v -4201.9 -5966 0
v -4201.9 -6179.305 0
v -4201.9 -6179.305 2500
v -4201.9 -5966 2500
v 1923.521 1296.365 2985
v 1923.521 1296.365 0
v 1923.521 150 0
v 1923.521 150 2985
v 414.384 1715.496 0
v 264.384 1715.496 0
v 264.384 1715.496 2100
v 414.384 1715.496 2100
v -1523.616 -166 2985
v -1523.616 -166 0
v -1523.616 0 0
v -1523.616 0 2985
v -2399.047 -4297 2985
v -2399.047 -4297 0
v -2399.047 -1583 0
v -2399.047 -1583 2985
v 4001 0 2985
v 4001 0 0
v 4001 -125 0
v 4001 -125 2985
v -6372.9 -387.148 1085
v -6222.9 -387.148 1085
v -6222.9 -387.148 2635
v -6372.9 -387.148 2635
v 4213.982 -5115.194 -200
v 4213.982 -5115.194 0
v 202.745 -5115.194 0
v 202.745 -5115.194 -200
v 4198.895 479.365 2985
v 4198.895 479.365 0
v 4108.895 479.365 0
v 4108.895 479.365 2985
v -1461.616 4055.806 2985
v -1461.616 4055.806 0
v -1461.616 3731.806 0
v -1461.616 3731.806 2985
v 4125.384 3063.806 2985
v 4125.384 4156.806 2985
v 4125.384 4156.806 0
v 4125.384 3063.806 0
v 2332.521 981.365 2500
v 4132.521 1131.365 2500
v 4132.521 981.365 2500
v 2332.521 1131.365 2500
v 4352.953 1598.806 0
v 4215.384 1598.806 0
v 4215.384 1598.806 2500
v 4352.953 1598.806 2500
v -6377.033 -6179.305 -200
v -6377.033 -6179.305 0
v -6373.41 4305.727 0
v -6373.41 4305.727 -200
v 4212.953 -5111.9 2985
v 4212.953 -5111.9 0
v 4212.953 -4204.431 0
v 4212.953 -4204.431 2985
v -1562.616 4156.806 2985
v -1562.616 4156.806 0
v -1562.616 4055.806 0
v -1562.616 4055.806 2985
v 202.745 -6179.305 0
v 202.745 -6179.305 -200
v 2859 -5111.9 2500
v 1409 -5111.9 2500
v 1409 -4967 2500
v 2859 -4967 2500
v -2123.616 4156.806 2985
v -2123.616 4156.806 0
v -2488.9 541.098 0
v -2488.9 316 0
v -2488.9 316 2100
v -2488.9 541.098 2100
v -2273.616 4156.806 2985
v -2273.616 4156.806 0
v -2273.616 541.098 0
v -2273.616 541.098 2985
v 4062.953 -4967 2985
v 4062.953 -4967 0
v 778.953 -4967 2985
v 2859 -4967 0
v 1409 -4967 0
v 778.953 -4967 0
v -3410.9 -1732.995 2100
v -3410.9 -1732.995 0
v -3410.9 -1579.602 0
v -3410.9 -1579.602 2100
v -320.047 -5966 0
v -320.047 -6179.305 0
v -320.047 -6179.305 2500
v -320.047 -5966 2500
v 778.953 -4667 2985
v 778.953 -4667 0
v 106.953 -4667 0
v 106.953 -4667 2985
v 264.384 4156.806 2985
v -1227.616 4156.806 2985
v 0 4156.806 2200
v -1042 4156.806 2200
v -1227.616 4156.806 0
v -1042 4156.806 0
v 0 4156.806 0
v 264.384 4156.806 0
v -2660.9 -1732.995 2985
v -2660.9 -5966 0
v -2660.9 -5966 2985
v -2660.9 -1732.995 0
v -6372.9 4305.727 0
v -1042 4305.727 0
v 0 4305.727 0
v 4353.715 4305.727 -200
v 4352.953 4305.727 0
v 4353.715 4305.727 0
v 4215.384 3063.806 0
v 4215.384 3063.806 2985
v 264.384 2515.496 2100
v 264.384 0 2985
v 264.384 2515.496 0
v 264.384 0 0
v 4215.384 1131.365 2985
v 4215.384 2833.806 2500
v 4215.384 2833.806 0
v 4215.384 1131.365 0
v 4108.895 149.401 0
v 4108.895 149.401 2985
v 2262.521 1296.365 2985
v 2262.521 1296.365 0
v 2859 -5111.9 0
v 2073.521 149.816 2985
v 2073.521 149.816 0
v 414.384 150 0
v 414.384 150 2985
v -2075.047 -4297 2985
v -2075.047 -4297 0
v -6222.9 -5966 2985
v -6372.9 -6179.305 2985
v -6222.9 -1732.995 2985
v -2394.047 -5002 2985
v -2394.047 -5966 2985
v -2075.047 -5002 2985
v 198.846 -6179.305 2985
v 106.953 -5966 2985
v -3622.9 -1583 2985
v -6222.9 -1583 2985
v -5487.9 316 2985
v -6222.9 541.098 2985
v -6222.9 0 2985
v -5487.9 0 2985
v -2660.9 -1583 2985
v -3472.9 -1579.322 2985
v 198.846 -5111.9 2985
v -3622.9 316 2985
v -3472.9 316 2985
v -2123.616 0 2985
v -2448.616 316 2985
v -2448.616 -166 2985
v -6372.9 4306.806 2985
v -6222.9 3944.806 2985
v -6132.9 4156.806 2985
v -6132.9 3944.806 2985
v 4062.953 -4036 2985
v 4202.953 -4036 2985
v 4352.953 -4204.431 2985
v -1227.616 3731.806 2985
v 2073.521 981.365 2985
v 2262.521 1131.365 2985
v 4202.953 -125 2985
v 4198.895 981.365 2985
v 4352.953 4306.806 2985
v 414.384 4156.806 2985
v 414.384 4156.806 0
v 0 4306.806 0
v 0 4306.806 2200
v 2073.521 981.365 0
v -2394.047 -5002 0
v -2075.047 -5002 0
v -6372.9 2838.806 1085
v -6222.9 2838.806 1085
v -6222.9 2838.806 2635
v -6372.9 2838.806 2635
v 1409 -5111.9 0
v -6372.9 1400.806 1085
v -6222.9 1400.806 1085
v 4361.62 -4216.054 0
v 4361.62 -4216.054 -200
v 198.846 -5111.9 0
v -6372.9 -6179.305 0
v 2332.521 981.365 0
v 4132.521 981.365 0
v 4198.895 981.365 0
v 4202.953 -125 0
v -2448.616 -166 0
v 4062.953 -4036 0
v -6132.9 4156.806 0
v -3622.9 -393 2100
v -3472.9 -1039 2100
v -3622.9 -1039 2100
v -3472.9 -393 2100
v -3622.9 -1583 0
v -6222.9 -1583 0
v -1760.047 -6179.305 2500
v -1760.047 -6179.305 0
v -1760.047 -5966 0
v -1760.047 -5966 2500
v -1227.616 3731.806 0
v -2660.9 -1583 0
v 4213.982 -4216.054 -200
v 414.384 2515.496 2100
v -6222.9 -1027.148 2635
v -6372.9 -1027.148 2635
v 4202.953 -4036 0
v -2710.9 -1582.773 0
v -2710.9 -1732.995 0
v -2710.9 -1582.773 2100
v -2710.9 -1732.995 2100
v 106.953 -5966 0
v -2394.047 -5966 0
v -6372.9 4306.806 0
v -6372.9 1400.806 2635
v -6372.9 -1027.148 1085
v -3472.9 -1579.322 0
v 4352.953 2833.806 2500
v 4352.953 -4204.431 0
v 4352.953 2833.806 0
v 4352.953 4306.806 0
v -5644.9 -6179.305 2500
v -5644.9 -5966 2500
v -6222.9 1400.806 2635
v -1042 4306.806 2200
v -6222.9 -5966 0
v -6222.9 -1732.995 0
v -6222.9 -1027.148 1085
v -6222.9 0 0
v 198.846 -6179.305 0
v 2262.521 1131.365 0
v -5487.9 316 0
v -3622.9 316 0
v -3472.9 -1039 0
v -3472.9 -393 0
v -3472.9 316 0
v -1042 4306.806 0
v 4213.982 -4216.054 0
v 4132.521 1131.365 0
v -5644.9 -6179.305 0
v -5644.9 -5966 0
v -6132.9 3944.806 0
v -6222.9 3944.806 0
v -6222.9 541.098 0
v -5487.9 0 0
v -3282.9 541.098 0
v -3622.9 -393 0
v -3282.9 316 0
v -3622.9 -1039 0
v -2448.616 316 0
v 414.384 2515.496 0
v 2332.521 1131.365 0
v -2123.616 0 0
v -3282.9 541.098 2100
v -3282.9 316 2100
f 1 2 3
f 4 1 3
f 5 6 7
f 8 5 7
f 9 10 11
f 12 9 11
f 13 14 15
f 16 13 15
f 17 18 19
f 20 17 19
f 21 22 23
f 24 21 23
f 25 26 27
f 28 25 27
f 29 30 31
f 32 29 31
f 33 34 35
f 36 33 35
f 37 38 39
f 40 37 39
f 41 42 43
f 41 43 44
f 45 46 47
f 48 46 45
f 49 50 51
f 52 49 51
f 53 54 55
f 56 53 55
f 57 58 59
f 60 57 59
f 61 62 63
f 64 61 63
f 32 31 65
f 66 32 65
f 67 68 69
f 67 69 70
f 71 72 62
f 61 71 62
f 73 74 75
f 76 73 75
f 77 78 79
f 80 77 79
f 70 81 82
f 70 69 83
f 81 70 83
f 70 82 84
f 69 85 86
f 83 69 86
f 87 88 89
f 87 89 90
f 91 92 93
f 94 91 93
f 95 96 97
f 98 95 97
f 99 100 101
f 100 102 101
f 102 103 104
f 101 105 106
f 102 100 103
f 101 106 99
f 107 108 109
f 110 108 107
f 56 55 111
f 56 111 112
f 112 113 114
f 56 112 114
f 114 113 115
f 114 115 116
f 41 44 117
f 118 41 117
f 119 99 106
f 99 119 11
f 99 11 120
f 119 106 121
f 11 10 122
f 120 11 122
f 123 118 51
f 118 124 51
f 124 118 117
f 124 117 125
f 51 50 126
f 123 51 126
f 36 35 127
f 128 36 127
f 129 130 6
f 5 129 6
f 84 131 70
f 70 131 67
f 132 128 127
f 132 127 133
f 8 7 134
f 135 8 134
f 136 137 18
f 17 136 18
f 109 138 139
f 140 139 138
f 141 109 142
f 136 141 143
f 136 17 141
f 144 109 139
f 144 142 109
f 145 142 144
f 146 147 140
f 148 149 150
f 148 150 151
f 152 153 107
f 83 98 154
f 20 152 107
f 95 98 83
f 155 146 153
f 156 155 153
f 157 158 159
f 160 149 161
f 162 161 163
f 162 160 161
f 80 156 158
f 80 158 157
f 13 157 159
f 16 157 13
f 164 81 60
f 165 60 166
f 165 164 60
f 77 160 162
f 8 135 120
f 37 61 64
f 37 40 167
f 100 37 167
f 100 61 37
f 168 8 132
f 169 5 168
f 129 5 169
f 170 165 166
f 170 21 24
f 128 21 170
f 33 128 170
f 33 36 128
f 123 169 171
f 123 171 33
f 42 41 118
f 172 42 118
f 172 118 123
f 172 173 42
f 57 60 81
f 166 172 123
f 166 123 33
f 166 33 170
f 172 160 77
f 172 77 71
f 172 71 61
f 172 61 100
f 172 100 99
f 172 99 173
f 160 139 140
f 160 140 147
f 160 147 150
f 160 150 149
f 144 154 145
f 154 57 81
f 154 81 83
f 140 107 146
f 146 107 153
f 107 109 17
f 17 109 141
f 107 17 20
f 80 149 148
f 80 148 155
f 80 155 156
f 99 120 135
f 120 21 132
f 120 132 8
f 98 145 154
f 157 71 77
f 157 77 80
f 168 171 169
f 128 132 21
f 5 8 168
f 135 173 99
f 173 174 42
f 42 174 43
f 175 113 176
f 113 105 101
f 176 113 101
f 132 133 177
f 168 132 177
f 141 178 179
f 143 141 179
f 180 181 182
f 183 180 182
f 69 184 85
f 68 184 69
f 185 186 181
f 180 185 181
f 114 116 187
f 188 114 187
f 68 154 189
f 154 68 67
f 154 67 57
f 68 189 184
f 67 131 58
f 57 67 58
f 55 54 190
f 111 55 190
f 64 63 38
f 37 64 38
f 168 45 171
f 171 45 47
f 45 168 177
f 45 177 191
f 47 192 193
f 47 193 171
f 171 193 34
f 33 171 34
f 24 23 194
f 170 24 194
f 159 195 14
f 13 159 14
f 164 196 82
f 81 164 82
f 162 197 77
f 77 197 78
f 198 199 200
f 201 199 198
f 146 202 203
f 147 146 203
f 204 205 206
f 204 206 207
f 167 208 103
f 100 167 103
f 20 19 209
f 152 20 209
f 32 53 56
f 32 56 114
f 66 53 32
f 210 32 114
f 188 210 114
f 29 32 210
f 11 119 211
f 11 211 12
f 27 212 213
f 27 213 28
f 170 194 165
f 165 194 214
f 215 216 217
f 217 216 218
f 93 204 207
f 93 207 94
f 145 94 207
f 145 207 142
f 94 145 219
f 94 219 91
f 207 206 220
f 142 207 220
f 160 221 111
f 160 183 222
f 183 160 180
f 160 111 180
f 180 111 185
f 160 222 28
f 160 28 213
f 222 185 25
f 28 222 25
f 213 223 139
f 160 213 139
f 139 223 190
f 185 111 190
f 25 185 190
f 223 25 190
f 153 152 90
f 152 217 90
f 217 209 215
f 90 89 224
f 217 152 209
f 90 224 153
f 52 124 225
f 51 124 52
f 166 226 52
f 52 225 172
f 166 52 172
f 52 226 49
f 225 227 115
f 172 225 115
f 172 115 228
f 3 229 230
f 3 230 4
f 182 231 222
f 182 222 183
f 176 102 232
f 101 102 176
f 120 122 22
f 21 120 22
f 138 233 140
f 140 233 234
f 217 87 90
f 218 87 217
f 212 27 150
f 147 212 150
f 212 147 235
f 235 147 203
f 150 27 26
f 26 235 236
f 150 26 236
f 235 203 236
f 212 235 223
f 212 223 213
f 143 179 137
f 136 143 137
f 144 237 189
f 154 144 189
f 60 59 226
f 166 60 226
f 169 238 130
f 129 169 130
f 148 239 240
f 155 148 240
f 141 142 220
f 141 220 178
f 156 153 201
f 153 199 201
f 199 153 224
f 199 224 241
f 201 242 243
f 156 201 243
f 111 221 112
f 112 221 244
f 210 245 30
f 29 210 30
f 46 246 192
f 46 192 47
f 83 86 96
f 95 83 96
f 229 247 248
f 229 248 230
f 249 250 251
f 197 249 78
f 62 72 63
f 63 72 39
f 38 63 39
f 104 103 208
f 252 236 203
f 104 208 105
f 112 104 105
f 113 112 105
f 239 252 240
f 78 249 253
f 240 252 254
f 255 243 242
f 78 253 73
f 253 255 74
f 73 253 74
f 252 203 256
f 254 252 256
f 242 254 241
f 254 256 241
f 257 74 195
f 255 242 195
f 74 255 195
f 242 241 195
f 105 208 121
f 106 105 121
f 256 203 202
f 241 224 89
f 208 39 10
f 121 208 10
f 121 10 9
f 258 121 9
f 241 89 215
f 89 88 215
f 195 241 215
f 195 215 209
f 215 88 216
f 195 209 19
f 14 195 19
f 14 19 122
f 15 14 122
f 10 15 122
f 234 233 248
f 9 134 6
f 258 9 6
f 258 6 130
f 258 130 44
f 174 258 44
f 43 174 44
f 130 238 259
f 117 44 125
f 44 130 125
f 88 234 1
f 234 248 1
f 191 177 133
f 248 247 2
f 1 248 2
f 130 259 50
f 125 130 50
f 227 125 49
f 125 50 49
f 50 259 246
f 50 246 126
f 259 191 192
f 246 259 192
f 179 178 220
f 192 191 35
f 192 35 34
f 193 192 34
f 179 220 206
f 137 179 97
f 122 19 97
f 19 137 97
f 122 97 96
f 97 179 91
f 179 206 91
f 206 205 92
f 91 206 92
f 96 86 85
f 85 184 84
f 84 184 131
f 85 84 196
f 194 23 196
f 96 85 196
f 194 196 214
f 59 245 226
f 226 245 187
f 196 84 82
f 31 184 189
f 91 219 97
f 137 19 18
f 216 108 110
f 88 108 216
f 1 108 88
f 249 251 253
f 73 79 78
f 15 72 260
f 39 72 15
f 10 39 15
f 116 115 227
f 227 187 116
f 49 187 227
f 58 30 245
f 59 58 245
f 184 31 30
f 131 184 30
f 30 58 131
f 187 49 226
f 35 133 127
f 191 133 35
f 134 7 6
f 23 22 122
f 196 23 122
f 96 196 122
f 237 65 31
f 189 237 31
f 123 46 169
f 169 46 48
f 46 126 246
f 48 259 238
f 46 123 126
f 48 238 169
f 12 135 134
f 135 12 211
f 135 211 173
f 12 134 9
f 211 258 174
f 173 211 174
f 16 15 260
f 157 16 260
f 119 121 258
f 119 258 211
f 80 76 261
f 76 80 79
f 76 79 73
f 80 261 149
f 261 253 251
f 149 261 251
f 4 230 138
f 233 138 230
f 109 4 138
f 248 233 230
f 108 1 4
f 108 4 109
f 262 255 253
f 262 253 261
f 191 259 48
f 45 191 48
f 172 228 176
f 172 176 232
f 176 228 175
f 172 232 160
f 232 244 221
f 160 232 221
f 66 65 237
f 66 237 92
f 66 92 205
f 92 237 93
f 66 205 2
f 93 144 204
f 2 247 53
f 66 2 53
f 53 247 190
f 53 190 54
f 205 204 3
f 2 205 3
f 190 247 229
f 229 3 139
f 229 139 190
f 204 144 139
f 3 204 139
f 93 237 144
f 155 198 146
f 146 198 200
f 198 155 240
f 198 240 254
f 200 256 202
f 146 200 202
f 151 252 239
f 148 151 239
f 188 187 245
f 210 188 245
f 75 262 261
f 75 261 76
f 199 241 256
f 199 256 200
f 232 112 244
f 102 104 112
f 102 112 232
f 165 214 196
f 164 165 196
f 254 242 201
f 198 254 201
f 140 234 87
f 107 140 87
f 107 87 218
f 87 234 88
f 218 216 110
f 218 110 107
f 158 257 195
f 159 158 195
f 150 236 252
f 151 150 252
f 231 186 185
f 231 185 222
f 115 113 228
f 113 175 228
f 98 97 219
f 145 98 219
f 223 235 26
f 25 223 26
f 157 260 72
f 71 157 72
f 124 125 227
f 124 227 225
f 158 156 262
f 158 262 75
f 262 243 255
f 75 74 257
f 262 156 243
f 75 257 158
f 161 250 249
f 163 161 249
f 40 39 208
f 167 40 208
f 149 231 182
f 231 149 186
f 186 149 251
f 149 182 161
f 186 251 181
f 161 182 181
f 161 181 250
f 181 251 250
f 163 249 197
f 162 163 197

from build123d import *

# Parameters (mm, degrees)
F0_W      = 3562
F0_H      = 4233.004609108
F1_DEPTH  = 2985
F2_W      = 1450
F2_H      = 2500
F3_DEPTH  = 144.9
F4_W      = 1440
F4_H      = 2500
F5_DEPTH  = 213.304599762
F6_W      = 1443
F6_H      = 2500
F7_DEPTH  = 213.304599762
F8_W      = 797
F8_H      = 2500
F9_DEPTH  = 4156.8055872194
F10_W     = 800
F10_H     = 2100
F11_DEPTH = 150
F12_W     = 1042
F12_H     = 2200
F13_DEPTH = 150
F14_W     = 1235
F14_H     = 2500
F15_DEPTH = 137.5694923401
F16_W     = 700
F16_H     = 2100
F17_DEPTH = 153.3939067339
F18_W     = 794
F18_H     = 2100
F19_DEPTH = 225.0975813866
F20_W     = 646
F20_H     = 2100
F21_DEPTH = 150
F22_W     = 640
F22_H     = 1550
F23_DEPTH = 150
F24_W     = 1438
F24_H     = 1550
F25_DEPTH = 150
F27_DEPTH = 200
F28_W     = 1800
F28_H     = 2500
F29_DEPTH = 150


with BuildPart() as f1:
    # F0 (on Top) → F1 (new body)
    with BuildSketch(Plane.XY):
        Polygon((1409, -5111.9), (2800.470790863, -5111.9), (4212.9532585144, -5111.9), (4212.9532585144, -4204.4310569763), (4352.9532585144, -4204.4310569763), (4352.9532585144, 4306.8055872194), (-2273.6162338257, 4306.8055872194), (-6372.8999999957, 4306.8055872194), (-6372.8999999957, 541.0975813866), (-6372.8999999957, -6179.304599762), (-2660.8999999957, -6179.304599762), (-1872.0002385101, -6179.304599762), (-435.1912385101, -6179.304599762), (198.84583354, -6179.304599762), (198.84583354, -5111.9), (720.84583354, -5111.9), (1350.470790863, -5111.9), align=None)
        with Locations((-4441.8999999957, -3849.497695446)):
            Rectangle(F0_W, F0_H, mode=Mode.SUBTRACT)
        Polygon((-5487.8999999957, 316), (-3622.8999999957, 316), (-3622.8999999957, -1583), (-6222.8999999957, -1583), (-6222.8999999957, 0), (-5487.8999999957, 0), align=None, mode=Mode.SUBTRACT)
        Polygon((-6132.8999999957, 4156.8055872194), (-2273.6162338257, 4156.8055872194), (-2273.6162338257, 541.0975813866), (-3622.8999999957, 541.0975813866), (-6222.8999999957, 541.0975813866), (-6222.8999999957, 3944.8055872194), (-6132.8999999957, 3944.8055872194), align=None, mode=Mode.SUBTRACT)
        Polygon((264.3837661743, 4156.8055872194), (264.3837661743, 0), (4001, 0), (4001, -125), (4202.9532585144, -125), (4202.9532585144, -4036), (4062.9532585144, -4036), (4062.9532585144, -4501.5), (4062.9532585144, -4967), (2970.9532585144, -4967), (1520.9532585144, -4967), (778.9532585144, -4967), (778.9532585144, -4667), (106.9532585144, -4667), (106.9532585144, -5966), (-320.0467414856, -5966), (-1760.0467414856, -5966), (-2394.0467414856, -5966), (-2394.0467414856, -5002), (-2075.0467414856, -5002), (-2075.0467414856, -4297), (-2399.0467414856, -4297), (-2399.0467414856, -1583), (-2660.8999999957, -1583), (-3472.8999999957, -1579.3216228485), (-3472.8999999957, 316), (-2448.6162338257, 316), (-2448.6162338257, -166), (-2123.6162338257, -166), (-1523.6162338257, -166), (-1523.6162338257, 0), (-2123.6162338257, 0), (-2123.6162338257, 150), (-2123.6162338257, 4156.8055872194), (-1562.6162338257, 4156.8055872194), (-1562.6162338257, 4055.8055872194), (-1461.6162338257, 4055.8055872194), (-1461.6162338257, 3731.8055872194), (-1227.6162338257, 3731.8055872194), (-1227.6162338257, 4156.8055872194), align=None, mode=Mode.SUBTRACT)
        Polygon((4198.8945047255, 981.3654631398), (4198.8945047255, 479.3654631398), (4108.8945047255, 479.3654631398), (4108.8945047255, 149.4008999277), (2259.8945047255, 149.7780185152), (2073.5213682051, 149.8160308321), (2073.5213682051, 981.3654631398), align=None, mode=Mode.SUBTRACT)
        Polygon((4215.3837661743, 1131.3654631398), (2262.5213682051, 1131.3654631398), (2262.5213682051, 1296.3654631398), (1923.5213682051, 1296.3654631398), (1923.5213682051, 150), (414.3837661743, 150), (414.3837661743, 1131.3654631398), (414.3837661743, 4156.8055872194), (4125.3837661743, 4156.8055872194), (4125.3837661743, 3063.8055872194), (4215.3837661743, 3063.8055872194), align=None, mode=Mode.SUBTRACT)
    extrude(amount=F1_DEPTH)

    # F2 (on face) → F3 (cut, through all)
    with BuildSketch(Plane.XZ.offset(5111.9)):
        with Locations((2134, 1250)):
            Rectangle(F2_W, F2_H)
    extrude(amount=-F3_DEPTH, mode=Mode.SUBTRACT)

    # F4 (on face) → F5 (cut, through all)
    with BuildSketch(Plane.XZ.offset(6179.304599762)):
        with Locations((-1040.0467414856, 1250)):
            Rectangle(F4_W, F4_H)
    extrude(amount=-F5_DEPTH, mode=Mode.SUBTRACT)

    # F6 (on face) → F7 (cut, through all)
    with BuildSketch(Plane.XZ.offset(6179.304599762)):
        with Locations((-4923.3999999957, 1250)):
            Rectangle(F6_W, F6_H)
    extrude(amount=-F7_DEPTH, mode=Mode.SUBTRACT)

    # F8 (on face) → F9 (cut, through all)
    with BuildSketch(Plane.XZ):
        with Locations((-398.5, 1250)):
            Rectangle(F8_W, F8_H)
    extrude(amount=-F9_DEPTH, mode=Mode.SUBTRACT)

    # F10 (on face) → F11 (cut, through all)
    with BuildSketch(Plane(origin=(264.3837661743, 0, 0), x_dir=(0, -1, 0), z_dir=(-1, 0, 0))):
        with Locations((-2115.4956257177, 1050)):
            Rectangle(F10_W, F10_H)
    extrude(amount=-F11_DEPTH, mode=Mode.SUBTRACT)

    # F12 (on face) → F13 (cut, through all)
    with BuildSketch(Plane.XZ.offset(-4156.8055872194)):
        with Locations((-521, 1100)):
            Rectangle(F12_W, F12_H)
    extrude(amount=-F13_DEPTH, mode=Mode.SUBTRACT)

    # F14 (on face) → F15 (cut, through all)
    with BuildSketch(Plane(origin=(4215.3837661743, 0, 0), x_dir=(0, -1, 0), z_dir=(-1, 0, 0))):
        with Locations((-2216.3055872194, 1250)):
            Rectangle(F14_W, F14_H)
    extrude(amount=-F15_DEPTH, mode=Mode.SUBTRACT)

    # F16 (on face) → F17 (cut, through all)
    with BuildSketch(Plane.XZ.offset(1732.995390892)):
        with Locations((-3060.8999999957, 1050)):
            Rectangle(F16_W, F16_H)
    extrude(amount=-F17_DEPTH, mode=Mode.SUBTRACT)

    # F18 (on face) → F19 (cut, through all)
    with BuildSketch(Plane.XZ.offset(-316)):
        with Locations((-2885.8999999957, 1050)):
            Rectangle(F18_W, F18_H)
    extrude(amount=-F19_DEPTH, mode=Mode.SUBTRACT)

    # F20 (on face) → F21 (cut, through all)
    with BuildSketch(Plane.YZ.offset(-3472.8999999957)):
        with Locations((-716, 1050)):
            Rectangle(F20_W, F20_H)
    extrude(amount=-F21_DEPTH, mode=Mode.SUBTRACT)

    # F22 (on face) → F23 (cut, through all)
    with BuildSketch(Plane.YZ.offset(-6222.8999999957)):
        with Locations((-707.1478068829, 1860)):
            Rectangle(F22_W, F22_H)
    extrude(amount=-F23_DEPTH, mode=Mode.SUBTRACT)

    # F24 (on face) → F25 (cut, through all)
    with BuildSketch(Plane.YZ.offset(-6222.8999999957)):
        with Locations((2119.8055872194, 1860)):
            Rectangle(F24_W, F24_H)
    extrude(amount=-F25_DEPTH, mode=Mode.SUBTRACT)

    # F26 (on face) → F27 (join)
    with BuildSketch(Plane(origin=(0, 0, 0), x_dir=(1, 0, 0), z_dir=(0, 0, -1))):
        Polygon((202.7448713779, 6179.304599762), (-6377.0327568054, 6179.304599762), (-6373.4097480774, -4305.7265281677), (4353.7154197693, -4305.7265281677), (4361.6199493408, 4216.0544395447), (4213.9821052551, 4216.0544395447), (4213.9821052551, 5115.1938438416), (202.7448713779, 5115.1938438416), align=None)
    extrude(amount=F27_DEPTH)

    # F28 (on face) → F29 (cut, through all)
    with BuildSketch(Plane(origin=(0, 1131.3654631398, 0), x_dir=(-1, 0, 0), z_dir=(0, 1, 0))):
        with Locations((-3232.5213682051, 1250)):
            Rectangle(F28_W, F28_H)
    extrude(amount=-F29_DEPTH, mode=Mode.SUBTRACT)


solid = f1.part
